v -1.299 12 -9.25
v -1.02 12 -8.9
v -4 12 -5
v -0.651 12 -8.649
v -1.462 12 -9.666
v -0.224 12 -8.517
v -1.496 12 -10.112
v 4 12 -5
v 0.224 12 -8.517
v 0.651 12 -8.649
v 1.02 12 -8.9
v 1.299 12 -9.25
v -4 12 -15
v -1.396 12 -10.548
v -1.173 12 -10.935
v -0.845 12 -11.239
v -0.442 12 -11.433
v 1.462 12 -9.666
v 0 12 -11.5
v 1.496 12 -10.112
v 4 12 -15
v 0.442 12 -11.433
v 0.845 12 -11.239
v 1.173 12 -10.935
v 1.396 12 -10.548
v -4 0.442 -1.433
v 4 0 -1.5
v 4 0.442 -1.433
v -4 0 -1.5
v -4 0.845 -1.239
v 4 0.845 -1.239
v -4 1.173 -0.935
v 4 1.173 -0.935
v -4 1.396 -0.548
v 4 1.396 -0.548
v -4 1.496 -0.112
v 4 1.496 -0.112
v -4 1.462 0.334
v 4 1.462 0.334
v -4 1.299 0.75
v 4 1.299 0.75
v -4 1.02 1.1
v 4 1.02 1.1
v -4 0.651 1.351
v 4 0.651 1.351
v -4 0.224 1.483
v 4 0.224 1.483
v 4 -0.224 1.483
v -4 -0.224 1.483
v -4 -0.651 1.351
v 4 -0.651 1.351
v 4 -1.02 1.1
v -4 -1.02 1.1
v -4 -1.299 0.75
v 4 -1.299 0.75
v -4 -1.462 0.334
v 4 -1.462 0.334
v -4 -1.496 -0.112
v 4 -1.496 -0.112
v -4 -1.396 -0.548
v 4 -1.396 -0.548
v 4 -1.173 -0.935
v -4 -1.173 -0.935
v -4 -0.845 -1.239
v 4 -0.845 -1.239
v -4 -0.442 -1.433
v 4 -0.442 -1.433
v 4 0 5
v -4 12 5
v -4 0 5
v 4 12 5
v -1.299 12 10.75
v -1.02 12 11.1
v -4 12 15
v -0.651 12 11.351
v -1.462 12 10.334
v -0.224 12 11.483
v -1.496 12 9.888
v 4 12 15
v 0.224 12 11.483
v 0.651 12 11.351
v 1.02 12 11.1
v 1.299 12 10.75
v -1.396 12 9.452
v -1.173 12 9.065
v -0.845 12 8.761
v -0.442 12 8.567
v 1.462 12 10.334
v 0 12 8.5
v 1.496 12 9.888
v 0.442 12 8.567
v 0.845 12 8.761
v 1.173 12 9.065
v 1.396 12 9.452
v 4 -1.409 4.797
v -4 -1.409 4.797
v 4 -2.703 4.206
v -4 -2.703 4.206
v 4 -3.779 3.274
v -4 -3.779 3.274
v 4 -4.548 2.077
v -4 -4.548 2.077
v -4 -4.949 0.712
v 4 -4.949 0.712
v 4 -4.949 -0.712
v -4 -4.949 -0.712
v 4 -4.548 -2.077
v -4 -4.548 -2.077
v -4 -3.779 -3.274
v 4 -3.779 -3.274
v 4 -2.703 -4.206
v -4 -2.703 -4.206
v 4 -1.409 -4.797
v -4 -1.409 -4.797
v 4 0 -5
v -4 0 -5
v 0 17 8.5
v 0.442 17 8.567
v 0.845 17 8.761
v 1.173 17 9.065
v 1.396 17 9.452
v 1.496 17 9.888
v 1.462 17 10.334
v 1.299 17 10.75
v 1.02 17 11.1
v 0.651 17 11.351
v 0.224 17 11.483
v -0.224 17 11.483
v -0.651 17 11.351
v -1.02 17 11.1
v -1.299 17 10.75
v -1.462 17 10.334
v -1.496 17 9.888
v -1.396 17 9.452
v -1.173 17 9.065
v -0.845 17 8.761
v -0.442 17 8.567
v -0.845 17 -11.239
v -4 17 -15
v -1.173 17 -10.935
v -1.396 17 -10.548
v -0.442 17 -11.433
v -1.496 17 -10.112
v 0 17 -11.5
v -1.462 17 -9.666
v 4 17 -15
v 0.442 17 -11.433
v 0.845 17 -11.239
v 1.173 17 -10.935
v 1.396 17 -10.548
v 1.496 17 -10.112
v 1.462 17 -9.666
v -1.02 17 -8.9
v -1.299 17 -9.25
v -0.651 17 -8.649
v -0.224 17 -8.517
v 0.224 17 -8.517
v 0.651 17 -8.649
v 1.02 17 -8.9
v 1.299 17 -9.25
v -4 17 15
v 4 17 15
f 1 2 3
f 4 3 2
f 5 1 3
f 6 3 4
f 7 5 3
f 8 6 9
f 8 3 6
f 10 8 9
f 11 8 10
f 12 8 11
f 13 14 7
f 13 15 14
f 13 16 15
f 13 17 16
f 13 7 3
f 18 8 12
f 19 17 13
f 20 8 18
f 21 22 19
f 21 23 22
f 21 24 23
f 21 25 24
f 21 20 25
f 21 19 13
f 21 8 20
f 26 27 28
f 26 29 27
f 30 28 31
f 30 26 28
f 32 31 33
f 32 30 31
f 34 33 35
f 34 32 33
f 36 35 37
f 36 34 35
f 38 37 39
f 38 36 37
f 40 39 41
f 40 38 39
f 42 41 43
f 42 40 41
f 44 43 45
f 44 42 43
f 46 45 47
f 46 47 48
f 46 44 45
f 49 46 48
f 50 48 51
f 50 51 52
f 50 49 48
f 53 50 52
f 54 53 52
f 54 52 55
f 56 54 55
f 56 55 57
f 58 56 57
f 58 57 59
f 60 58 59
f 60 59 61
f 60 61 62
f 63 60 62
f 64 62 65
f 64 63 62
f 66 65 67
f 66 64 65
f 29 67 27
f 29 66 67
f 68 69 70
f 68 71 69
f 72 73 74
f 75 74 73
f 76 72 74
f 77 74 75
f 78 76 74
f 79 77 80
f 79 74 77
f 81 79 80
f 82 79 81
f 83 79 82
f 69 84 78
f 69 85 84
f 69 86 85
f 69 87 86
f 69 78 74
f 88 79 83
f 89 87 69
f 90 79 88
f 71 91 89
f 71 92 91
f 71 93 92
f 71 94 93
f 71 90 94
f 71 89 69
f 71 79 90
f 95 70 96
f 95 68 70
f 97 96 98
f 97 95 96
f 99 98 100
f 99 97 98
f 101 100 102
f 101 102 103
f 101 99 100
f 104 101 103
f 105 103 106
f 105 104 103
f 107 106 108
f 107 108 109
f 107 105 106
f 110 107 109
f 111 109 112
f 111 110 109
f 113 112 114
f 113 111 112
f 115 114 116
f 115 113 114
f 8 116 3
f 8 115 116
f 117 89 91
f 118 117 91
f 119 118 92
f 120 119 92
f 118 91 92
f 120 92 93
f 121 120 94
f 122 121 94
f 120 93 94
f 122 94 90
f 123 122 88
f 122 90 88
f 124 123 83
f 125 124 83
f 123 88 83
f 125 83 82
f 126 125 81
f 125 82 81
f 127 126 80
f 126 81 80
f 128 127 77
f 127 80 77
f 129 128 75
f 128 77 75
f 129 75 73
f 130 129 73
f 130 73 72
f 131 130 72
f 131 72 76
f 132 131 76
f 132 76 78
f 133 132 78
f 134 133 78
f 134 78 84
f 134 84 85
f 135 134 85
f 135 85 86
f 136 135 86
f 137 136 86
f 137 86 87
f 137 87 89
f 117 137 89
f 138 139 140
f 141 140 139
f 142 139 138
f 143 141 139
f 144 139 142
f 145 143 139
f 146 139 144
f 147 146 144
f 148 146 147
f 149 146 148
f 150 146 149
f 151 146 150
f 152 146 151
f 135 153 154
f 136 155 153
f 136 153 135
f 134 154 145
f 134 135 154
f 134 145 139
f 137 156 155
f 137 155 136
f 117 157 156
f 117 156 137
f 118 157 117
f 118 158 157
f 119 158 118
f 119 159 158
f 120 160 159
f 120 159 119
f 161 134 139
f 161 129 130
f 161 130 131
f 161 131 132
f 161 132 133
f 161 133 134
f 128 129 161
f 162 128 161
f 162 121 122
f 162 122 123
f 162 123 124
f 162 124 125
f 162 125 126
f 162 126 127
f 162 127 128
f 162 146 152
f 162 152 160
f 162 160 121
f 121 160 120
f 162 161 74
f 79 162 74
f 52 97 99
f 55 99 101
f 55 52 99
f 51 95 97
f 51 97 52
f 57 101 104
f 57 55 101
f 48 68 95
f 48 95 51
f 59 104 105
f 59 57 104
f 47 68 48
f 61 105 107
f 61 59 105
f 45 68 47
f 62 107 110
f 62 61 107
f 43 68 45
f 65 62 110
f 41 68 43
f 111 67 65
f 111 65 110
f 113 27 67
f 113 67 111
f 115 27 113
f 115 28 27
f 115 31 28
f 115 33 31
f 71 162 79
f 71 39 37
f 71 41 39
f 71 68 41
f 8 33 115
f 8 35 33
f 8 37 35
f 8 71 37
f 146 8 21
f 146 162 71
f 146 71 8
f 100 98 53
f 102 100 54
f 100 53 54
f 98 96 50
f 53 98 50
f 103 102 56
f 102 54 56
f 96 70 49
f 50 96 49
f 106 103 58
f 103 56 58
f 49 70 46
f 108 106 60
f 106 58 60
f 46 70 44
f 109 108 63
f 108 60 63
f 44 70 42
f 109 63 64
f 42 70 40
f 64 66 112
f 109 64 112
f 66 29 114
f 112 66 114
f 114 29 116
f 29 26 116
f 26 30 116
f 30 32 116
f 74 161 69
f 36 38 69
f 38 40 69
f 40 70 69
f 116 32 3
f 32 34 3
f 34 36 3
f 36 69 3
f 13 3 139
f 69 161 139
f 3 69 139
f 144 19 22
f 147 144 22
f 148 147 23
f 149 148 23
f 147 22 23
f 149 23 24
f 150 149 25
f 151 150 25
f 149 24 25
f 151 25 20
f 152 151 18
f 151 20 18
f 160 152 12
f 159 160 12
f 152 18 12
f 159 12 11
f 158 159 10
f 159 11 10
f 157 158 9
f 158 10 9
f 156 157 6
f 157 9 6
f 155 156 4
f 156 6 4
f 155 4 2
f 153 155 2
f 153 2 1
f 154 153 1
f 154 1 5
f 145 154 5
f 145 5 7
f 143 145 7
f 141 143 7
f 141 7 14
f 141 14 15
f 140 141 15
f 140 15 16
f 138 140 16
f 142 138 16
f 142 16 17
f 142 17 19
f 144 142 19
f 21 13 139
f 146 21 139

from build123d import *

# Parameters (mm, degrees)
SKETCH_1_R          = 1.5
EXTRUDE_1_DEPTH     = 4
CUT_EXTRUDE_1_REACH = 25.022
SKETCH_2_R          = 1.5


with BuildPart() as part:
    # 草图1 → 凸台-拉伸1 (new, symmetric)
    with BuildSketch(Plane(origin=(0, 0, 0), x_dir=(0, 0, -1), z_dir=(1, 0, 0))):
        with BuildLine():
            Line((5, 12), (15, 12))
            Line((15, 12), (15, 17))
            Line((15, 17), (-15, 17))
            Line((-15, 17), (-15, 12))
            Line((-15, 12), (-5, 12))
            Line((-5, 12), (-5, 0))
            ThreePointArc((-5, 0), (0, -5), (5, 0))
            Line((5, 0), (5, 12))
        make_face()
        Circle(SKETCH_1_R, mode=Mode.SUBTRACT)
    extrude(amount=EXTRUDE_1_DEPTH, both=True)

    # 草图2 → 切除-拉伸1 (cut, up to next)
    with BuildSketch(Plane.XZ.offset(-12), mode=Mode.PRIVATE) as cut_extrude_1_sk1:
        with Locations(Location((0, 10, 0), (0, 0, 270))):
            Circle(SKETCH_2_R)
    cut_extrude_1_tool1 = extrude(cut_extrude_1_sk1.sketch, amount=-CUT_EXTRUDE_1_REACH, mode=Mode.PRIVATE) & part.part
    # 草图2 → 切除-拉伸1 (cut, up to next)
    with BuildSketch(Plane.XZ.offset(-12), mode=Mode.PRIVATE) as cut_extrude_1_sk2:
        with Locations(Location((0, -10, 0), (0, 0, 270))):
            Circle(SKETCH_2_R)
    cut_extrude_1_tool2 = extrude(cut_extrude_1_sk2.sketch, amount=-CUT_EXTRUDE_1_REACH, mode=Mode.PRIVATE) & part.part
    add(cut_extrude_1_tool1.solids().sort_by_distance((0, 12, 10))[0], mode=Mode.SUBTRACT)
    add(cut_extrude_1_tool2.solids().sort_by_distance((0, 12, -10))[0], mode=Mode.SUBTRACT)


solid = part.part
